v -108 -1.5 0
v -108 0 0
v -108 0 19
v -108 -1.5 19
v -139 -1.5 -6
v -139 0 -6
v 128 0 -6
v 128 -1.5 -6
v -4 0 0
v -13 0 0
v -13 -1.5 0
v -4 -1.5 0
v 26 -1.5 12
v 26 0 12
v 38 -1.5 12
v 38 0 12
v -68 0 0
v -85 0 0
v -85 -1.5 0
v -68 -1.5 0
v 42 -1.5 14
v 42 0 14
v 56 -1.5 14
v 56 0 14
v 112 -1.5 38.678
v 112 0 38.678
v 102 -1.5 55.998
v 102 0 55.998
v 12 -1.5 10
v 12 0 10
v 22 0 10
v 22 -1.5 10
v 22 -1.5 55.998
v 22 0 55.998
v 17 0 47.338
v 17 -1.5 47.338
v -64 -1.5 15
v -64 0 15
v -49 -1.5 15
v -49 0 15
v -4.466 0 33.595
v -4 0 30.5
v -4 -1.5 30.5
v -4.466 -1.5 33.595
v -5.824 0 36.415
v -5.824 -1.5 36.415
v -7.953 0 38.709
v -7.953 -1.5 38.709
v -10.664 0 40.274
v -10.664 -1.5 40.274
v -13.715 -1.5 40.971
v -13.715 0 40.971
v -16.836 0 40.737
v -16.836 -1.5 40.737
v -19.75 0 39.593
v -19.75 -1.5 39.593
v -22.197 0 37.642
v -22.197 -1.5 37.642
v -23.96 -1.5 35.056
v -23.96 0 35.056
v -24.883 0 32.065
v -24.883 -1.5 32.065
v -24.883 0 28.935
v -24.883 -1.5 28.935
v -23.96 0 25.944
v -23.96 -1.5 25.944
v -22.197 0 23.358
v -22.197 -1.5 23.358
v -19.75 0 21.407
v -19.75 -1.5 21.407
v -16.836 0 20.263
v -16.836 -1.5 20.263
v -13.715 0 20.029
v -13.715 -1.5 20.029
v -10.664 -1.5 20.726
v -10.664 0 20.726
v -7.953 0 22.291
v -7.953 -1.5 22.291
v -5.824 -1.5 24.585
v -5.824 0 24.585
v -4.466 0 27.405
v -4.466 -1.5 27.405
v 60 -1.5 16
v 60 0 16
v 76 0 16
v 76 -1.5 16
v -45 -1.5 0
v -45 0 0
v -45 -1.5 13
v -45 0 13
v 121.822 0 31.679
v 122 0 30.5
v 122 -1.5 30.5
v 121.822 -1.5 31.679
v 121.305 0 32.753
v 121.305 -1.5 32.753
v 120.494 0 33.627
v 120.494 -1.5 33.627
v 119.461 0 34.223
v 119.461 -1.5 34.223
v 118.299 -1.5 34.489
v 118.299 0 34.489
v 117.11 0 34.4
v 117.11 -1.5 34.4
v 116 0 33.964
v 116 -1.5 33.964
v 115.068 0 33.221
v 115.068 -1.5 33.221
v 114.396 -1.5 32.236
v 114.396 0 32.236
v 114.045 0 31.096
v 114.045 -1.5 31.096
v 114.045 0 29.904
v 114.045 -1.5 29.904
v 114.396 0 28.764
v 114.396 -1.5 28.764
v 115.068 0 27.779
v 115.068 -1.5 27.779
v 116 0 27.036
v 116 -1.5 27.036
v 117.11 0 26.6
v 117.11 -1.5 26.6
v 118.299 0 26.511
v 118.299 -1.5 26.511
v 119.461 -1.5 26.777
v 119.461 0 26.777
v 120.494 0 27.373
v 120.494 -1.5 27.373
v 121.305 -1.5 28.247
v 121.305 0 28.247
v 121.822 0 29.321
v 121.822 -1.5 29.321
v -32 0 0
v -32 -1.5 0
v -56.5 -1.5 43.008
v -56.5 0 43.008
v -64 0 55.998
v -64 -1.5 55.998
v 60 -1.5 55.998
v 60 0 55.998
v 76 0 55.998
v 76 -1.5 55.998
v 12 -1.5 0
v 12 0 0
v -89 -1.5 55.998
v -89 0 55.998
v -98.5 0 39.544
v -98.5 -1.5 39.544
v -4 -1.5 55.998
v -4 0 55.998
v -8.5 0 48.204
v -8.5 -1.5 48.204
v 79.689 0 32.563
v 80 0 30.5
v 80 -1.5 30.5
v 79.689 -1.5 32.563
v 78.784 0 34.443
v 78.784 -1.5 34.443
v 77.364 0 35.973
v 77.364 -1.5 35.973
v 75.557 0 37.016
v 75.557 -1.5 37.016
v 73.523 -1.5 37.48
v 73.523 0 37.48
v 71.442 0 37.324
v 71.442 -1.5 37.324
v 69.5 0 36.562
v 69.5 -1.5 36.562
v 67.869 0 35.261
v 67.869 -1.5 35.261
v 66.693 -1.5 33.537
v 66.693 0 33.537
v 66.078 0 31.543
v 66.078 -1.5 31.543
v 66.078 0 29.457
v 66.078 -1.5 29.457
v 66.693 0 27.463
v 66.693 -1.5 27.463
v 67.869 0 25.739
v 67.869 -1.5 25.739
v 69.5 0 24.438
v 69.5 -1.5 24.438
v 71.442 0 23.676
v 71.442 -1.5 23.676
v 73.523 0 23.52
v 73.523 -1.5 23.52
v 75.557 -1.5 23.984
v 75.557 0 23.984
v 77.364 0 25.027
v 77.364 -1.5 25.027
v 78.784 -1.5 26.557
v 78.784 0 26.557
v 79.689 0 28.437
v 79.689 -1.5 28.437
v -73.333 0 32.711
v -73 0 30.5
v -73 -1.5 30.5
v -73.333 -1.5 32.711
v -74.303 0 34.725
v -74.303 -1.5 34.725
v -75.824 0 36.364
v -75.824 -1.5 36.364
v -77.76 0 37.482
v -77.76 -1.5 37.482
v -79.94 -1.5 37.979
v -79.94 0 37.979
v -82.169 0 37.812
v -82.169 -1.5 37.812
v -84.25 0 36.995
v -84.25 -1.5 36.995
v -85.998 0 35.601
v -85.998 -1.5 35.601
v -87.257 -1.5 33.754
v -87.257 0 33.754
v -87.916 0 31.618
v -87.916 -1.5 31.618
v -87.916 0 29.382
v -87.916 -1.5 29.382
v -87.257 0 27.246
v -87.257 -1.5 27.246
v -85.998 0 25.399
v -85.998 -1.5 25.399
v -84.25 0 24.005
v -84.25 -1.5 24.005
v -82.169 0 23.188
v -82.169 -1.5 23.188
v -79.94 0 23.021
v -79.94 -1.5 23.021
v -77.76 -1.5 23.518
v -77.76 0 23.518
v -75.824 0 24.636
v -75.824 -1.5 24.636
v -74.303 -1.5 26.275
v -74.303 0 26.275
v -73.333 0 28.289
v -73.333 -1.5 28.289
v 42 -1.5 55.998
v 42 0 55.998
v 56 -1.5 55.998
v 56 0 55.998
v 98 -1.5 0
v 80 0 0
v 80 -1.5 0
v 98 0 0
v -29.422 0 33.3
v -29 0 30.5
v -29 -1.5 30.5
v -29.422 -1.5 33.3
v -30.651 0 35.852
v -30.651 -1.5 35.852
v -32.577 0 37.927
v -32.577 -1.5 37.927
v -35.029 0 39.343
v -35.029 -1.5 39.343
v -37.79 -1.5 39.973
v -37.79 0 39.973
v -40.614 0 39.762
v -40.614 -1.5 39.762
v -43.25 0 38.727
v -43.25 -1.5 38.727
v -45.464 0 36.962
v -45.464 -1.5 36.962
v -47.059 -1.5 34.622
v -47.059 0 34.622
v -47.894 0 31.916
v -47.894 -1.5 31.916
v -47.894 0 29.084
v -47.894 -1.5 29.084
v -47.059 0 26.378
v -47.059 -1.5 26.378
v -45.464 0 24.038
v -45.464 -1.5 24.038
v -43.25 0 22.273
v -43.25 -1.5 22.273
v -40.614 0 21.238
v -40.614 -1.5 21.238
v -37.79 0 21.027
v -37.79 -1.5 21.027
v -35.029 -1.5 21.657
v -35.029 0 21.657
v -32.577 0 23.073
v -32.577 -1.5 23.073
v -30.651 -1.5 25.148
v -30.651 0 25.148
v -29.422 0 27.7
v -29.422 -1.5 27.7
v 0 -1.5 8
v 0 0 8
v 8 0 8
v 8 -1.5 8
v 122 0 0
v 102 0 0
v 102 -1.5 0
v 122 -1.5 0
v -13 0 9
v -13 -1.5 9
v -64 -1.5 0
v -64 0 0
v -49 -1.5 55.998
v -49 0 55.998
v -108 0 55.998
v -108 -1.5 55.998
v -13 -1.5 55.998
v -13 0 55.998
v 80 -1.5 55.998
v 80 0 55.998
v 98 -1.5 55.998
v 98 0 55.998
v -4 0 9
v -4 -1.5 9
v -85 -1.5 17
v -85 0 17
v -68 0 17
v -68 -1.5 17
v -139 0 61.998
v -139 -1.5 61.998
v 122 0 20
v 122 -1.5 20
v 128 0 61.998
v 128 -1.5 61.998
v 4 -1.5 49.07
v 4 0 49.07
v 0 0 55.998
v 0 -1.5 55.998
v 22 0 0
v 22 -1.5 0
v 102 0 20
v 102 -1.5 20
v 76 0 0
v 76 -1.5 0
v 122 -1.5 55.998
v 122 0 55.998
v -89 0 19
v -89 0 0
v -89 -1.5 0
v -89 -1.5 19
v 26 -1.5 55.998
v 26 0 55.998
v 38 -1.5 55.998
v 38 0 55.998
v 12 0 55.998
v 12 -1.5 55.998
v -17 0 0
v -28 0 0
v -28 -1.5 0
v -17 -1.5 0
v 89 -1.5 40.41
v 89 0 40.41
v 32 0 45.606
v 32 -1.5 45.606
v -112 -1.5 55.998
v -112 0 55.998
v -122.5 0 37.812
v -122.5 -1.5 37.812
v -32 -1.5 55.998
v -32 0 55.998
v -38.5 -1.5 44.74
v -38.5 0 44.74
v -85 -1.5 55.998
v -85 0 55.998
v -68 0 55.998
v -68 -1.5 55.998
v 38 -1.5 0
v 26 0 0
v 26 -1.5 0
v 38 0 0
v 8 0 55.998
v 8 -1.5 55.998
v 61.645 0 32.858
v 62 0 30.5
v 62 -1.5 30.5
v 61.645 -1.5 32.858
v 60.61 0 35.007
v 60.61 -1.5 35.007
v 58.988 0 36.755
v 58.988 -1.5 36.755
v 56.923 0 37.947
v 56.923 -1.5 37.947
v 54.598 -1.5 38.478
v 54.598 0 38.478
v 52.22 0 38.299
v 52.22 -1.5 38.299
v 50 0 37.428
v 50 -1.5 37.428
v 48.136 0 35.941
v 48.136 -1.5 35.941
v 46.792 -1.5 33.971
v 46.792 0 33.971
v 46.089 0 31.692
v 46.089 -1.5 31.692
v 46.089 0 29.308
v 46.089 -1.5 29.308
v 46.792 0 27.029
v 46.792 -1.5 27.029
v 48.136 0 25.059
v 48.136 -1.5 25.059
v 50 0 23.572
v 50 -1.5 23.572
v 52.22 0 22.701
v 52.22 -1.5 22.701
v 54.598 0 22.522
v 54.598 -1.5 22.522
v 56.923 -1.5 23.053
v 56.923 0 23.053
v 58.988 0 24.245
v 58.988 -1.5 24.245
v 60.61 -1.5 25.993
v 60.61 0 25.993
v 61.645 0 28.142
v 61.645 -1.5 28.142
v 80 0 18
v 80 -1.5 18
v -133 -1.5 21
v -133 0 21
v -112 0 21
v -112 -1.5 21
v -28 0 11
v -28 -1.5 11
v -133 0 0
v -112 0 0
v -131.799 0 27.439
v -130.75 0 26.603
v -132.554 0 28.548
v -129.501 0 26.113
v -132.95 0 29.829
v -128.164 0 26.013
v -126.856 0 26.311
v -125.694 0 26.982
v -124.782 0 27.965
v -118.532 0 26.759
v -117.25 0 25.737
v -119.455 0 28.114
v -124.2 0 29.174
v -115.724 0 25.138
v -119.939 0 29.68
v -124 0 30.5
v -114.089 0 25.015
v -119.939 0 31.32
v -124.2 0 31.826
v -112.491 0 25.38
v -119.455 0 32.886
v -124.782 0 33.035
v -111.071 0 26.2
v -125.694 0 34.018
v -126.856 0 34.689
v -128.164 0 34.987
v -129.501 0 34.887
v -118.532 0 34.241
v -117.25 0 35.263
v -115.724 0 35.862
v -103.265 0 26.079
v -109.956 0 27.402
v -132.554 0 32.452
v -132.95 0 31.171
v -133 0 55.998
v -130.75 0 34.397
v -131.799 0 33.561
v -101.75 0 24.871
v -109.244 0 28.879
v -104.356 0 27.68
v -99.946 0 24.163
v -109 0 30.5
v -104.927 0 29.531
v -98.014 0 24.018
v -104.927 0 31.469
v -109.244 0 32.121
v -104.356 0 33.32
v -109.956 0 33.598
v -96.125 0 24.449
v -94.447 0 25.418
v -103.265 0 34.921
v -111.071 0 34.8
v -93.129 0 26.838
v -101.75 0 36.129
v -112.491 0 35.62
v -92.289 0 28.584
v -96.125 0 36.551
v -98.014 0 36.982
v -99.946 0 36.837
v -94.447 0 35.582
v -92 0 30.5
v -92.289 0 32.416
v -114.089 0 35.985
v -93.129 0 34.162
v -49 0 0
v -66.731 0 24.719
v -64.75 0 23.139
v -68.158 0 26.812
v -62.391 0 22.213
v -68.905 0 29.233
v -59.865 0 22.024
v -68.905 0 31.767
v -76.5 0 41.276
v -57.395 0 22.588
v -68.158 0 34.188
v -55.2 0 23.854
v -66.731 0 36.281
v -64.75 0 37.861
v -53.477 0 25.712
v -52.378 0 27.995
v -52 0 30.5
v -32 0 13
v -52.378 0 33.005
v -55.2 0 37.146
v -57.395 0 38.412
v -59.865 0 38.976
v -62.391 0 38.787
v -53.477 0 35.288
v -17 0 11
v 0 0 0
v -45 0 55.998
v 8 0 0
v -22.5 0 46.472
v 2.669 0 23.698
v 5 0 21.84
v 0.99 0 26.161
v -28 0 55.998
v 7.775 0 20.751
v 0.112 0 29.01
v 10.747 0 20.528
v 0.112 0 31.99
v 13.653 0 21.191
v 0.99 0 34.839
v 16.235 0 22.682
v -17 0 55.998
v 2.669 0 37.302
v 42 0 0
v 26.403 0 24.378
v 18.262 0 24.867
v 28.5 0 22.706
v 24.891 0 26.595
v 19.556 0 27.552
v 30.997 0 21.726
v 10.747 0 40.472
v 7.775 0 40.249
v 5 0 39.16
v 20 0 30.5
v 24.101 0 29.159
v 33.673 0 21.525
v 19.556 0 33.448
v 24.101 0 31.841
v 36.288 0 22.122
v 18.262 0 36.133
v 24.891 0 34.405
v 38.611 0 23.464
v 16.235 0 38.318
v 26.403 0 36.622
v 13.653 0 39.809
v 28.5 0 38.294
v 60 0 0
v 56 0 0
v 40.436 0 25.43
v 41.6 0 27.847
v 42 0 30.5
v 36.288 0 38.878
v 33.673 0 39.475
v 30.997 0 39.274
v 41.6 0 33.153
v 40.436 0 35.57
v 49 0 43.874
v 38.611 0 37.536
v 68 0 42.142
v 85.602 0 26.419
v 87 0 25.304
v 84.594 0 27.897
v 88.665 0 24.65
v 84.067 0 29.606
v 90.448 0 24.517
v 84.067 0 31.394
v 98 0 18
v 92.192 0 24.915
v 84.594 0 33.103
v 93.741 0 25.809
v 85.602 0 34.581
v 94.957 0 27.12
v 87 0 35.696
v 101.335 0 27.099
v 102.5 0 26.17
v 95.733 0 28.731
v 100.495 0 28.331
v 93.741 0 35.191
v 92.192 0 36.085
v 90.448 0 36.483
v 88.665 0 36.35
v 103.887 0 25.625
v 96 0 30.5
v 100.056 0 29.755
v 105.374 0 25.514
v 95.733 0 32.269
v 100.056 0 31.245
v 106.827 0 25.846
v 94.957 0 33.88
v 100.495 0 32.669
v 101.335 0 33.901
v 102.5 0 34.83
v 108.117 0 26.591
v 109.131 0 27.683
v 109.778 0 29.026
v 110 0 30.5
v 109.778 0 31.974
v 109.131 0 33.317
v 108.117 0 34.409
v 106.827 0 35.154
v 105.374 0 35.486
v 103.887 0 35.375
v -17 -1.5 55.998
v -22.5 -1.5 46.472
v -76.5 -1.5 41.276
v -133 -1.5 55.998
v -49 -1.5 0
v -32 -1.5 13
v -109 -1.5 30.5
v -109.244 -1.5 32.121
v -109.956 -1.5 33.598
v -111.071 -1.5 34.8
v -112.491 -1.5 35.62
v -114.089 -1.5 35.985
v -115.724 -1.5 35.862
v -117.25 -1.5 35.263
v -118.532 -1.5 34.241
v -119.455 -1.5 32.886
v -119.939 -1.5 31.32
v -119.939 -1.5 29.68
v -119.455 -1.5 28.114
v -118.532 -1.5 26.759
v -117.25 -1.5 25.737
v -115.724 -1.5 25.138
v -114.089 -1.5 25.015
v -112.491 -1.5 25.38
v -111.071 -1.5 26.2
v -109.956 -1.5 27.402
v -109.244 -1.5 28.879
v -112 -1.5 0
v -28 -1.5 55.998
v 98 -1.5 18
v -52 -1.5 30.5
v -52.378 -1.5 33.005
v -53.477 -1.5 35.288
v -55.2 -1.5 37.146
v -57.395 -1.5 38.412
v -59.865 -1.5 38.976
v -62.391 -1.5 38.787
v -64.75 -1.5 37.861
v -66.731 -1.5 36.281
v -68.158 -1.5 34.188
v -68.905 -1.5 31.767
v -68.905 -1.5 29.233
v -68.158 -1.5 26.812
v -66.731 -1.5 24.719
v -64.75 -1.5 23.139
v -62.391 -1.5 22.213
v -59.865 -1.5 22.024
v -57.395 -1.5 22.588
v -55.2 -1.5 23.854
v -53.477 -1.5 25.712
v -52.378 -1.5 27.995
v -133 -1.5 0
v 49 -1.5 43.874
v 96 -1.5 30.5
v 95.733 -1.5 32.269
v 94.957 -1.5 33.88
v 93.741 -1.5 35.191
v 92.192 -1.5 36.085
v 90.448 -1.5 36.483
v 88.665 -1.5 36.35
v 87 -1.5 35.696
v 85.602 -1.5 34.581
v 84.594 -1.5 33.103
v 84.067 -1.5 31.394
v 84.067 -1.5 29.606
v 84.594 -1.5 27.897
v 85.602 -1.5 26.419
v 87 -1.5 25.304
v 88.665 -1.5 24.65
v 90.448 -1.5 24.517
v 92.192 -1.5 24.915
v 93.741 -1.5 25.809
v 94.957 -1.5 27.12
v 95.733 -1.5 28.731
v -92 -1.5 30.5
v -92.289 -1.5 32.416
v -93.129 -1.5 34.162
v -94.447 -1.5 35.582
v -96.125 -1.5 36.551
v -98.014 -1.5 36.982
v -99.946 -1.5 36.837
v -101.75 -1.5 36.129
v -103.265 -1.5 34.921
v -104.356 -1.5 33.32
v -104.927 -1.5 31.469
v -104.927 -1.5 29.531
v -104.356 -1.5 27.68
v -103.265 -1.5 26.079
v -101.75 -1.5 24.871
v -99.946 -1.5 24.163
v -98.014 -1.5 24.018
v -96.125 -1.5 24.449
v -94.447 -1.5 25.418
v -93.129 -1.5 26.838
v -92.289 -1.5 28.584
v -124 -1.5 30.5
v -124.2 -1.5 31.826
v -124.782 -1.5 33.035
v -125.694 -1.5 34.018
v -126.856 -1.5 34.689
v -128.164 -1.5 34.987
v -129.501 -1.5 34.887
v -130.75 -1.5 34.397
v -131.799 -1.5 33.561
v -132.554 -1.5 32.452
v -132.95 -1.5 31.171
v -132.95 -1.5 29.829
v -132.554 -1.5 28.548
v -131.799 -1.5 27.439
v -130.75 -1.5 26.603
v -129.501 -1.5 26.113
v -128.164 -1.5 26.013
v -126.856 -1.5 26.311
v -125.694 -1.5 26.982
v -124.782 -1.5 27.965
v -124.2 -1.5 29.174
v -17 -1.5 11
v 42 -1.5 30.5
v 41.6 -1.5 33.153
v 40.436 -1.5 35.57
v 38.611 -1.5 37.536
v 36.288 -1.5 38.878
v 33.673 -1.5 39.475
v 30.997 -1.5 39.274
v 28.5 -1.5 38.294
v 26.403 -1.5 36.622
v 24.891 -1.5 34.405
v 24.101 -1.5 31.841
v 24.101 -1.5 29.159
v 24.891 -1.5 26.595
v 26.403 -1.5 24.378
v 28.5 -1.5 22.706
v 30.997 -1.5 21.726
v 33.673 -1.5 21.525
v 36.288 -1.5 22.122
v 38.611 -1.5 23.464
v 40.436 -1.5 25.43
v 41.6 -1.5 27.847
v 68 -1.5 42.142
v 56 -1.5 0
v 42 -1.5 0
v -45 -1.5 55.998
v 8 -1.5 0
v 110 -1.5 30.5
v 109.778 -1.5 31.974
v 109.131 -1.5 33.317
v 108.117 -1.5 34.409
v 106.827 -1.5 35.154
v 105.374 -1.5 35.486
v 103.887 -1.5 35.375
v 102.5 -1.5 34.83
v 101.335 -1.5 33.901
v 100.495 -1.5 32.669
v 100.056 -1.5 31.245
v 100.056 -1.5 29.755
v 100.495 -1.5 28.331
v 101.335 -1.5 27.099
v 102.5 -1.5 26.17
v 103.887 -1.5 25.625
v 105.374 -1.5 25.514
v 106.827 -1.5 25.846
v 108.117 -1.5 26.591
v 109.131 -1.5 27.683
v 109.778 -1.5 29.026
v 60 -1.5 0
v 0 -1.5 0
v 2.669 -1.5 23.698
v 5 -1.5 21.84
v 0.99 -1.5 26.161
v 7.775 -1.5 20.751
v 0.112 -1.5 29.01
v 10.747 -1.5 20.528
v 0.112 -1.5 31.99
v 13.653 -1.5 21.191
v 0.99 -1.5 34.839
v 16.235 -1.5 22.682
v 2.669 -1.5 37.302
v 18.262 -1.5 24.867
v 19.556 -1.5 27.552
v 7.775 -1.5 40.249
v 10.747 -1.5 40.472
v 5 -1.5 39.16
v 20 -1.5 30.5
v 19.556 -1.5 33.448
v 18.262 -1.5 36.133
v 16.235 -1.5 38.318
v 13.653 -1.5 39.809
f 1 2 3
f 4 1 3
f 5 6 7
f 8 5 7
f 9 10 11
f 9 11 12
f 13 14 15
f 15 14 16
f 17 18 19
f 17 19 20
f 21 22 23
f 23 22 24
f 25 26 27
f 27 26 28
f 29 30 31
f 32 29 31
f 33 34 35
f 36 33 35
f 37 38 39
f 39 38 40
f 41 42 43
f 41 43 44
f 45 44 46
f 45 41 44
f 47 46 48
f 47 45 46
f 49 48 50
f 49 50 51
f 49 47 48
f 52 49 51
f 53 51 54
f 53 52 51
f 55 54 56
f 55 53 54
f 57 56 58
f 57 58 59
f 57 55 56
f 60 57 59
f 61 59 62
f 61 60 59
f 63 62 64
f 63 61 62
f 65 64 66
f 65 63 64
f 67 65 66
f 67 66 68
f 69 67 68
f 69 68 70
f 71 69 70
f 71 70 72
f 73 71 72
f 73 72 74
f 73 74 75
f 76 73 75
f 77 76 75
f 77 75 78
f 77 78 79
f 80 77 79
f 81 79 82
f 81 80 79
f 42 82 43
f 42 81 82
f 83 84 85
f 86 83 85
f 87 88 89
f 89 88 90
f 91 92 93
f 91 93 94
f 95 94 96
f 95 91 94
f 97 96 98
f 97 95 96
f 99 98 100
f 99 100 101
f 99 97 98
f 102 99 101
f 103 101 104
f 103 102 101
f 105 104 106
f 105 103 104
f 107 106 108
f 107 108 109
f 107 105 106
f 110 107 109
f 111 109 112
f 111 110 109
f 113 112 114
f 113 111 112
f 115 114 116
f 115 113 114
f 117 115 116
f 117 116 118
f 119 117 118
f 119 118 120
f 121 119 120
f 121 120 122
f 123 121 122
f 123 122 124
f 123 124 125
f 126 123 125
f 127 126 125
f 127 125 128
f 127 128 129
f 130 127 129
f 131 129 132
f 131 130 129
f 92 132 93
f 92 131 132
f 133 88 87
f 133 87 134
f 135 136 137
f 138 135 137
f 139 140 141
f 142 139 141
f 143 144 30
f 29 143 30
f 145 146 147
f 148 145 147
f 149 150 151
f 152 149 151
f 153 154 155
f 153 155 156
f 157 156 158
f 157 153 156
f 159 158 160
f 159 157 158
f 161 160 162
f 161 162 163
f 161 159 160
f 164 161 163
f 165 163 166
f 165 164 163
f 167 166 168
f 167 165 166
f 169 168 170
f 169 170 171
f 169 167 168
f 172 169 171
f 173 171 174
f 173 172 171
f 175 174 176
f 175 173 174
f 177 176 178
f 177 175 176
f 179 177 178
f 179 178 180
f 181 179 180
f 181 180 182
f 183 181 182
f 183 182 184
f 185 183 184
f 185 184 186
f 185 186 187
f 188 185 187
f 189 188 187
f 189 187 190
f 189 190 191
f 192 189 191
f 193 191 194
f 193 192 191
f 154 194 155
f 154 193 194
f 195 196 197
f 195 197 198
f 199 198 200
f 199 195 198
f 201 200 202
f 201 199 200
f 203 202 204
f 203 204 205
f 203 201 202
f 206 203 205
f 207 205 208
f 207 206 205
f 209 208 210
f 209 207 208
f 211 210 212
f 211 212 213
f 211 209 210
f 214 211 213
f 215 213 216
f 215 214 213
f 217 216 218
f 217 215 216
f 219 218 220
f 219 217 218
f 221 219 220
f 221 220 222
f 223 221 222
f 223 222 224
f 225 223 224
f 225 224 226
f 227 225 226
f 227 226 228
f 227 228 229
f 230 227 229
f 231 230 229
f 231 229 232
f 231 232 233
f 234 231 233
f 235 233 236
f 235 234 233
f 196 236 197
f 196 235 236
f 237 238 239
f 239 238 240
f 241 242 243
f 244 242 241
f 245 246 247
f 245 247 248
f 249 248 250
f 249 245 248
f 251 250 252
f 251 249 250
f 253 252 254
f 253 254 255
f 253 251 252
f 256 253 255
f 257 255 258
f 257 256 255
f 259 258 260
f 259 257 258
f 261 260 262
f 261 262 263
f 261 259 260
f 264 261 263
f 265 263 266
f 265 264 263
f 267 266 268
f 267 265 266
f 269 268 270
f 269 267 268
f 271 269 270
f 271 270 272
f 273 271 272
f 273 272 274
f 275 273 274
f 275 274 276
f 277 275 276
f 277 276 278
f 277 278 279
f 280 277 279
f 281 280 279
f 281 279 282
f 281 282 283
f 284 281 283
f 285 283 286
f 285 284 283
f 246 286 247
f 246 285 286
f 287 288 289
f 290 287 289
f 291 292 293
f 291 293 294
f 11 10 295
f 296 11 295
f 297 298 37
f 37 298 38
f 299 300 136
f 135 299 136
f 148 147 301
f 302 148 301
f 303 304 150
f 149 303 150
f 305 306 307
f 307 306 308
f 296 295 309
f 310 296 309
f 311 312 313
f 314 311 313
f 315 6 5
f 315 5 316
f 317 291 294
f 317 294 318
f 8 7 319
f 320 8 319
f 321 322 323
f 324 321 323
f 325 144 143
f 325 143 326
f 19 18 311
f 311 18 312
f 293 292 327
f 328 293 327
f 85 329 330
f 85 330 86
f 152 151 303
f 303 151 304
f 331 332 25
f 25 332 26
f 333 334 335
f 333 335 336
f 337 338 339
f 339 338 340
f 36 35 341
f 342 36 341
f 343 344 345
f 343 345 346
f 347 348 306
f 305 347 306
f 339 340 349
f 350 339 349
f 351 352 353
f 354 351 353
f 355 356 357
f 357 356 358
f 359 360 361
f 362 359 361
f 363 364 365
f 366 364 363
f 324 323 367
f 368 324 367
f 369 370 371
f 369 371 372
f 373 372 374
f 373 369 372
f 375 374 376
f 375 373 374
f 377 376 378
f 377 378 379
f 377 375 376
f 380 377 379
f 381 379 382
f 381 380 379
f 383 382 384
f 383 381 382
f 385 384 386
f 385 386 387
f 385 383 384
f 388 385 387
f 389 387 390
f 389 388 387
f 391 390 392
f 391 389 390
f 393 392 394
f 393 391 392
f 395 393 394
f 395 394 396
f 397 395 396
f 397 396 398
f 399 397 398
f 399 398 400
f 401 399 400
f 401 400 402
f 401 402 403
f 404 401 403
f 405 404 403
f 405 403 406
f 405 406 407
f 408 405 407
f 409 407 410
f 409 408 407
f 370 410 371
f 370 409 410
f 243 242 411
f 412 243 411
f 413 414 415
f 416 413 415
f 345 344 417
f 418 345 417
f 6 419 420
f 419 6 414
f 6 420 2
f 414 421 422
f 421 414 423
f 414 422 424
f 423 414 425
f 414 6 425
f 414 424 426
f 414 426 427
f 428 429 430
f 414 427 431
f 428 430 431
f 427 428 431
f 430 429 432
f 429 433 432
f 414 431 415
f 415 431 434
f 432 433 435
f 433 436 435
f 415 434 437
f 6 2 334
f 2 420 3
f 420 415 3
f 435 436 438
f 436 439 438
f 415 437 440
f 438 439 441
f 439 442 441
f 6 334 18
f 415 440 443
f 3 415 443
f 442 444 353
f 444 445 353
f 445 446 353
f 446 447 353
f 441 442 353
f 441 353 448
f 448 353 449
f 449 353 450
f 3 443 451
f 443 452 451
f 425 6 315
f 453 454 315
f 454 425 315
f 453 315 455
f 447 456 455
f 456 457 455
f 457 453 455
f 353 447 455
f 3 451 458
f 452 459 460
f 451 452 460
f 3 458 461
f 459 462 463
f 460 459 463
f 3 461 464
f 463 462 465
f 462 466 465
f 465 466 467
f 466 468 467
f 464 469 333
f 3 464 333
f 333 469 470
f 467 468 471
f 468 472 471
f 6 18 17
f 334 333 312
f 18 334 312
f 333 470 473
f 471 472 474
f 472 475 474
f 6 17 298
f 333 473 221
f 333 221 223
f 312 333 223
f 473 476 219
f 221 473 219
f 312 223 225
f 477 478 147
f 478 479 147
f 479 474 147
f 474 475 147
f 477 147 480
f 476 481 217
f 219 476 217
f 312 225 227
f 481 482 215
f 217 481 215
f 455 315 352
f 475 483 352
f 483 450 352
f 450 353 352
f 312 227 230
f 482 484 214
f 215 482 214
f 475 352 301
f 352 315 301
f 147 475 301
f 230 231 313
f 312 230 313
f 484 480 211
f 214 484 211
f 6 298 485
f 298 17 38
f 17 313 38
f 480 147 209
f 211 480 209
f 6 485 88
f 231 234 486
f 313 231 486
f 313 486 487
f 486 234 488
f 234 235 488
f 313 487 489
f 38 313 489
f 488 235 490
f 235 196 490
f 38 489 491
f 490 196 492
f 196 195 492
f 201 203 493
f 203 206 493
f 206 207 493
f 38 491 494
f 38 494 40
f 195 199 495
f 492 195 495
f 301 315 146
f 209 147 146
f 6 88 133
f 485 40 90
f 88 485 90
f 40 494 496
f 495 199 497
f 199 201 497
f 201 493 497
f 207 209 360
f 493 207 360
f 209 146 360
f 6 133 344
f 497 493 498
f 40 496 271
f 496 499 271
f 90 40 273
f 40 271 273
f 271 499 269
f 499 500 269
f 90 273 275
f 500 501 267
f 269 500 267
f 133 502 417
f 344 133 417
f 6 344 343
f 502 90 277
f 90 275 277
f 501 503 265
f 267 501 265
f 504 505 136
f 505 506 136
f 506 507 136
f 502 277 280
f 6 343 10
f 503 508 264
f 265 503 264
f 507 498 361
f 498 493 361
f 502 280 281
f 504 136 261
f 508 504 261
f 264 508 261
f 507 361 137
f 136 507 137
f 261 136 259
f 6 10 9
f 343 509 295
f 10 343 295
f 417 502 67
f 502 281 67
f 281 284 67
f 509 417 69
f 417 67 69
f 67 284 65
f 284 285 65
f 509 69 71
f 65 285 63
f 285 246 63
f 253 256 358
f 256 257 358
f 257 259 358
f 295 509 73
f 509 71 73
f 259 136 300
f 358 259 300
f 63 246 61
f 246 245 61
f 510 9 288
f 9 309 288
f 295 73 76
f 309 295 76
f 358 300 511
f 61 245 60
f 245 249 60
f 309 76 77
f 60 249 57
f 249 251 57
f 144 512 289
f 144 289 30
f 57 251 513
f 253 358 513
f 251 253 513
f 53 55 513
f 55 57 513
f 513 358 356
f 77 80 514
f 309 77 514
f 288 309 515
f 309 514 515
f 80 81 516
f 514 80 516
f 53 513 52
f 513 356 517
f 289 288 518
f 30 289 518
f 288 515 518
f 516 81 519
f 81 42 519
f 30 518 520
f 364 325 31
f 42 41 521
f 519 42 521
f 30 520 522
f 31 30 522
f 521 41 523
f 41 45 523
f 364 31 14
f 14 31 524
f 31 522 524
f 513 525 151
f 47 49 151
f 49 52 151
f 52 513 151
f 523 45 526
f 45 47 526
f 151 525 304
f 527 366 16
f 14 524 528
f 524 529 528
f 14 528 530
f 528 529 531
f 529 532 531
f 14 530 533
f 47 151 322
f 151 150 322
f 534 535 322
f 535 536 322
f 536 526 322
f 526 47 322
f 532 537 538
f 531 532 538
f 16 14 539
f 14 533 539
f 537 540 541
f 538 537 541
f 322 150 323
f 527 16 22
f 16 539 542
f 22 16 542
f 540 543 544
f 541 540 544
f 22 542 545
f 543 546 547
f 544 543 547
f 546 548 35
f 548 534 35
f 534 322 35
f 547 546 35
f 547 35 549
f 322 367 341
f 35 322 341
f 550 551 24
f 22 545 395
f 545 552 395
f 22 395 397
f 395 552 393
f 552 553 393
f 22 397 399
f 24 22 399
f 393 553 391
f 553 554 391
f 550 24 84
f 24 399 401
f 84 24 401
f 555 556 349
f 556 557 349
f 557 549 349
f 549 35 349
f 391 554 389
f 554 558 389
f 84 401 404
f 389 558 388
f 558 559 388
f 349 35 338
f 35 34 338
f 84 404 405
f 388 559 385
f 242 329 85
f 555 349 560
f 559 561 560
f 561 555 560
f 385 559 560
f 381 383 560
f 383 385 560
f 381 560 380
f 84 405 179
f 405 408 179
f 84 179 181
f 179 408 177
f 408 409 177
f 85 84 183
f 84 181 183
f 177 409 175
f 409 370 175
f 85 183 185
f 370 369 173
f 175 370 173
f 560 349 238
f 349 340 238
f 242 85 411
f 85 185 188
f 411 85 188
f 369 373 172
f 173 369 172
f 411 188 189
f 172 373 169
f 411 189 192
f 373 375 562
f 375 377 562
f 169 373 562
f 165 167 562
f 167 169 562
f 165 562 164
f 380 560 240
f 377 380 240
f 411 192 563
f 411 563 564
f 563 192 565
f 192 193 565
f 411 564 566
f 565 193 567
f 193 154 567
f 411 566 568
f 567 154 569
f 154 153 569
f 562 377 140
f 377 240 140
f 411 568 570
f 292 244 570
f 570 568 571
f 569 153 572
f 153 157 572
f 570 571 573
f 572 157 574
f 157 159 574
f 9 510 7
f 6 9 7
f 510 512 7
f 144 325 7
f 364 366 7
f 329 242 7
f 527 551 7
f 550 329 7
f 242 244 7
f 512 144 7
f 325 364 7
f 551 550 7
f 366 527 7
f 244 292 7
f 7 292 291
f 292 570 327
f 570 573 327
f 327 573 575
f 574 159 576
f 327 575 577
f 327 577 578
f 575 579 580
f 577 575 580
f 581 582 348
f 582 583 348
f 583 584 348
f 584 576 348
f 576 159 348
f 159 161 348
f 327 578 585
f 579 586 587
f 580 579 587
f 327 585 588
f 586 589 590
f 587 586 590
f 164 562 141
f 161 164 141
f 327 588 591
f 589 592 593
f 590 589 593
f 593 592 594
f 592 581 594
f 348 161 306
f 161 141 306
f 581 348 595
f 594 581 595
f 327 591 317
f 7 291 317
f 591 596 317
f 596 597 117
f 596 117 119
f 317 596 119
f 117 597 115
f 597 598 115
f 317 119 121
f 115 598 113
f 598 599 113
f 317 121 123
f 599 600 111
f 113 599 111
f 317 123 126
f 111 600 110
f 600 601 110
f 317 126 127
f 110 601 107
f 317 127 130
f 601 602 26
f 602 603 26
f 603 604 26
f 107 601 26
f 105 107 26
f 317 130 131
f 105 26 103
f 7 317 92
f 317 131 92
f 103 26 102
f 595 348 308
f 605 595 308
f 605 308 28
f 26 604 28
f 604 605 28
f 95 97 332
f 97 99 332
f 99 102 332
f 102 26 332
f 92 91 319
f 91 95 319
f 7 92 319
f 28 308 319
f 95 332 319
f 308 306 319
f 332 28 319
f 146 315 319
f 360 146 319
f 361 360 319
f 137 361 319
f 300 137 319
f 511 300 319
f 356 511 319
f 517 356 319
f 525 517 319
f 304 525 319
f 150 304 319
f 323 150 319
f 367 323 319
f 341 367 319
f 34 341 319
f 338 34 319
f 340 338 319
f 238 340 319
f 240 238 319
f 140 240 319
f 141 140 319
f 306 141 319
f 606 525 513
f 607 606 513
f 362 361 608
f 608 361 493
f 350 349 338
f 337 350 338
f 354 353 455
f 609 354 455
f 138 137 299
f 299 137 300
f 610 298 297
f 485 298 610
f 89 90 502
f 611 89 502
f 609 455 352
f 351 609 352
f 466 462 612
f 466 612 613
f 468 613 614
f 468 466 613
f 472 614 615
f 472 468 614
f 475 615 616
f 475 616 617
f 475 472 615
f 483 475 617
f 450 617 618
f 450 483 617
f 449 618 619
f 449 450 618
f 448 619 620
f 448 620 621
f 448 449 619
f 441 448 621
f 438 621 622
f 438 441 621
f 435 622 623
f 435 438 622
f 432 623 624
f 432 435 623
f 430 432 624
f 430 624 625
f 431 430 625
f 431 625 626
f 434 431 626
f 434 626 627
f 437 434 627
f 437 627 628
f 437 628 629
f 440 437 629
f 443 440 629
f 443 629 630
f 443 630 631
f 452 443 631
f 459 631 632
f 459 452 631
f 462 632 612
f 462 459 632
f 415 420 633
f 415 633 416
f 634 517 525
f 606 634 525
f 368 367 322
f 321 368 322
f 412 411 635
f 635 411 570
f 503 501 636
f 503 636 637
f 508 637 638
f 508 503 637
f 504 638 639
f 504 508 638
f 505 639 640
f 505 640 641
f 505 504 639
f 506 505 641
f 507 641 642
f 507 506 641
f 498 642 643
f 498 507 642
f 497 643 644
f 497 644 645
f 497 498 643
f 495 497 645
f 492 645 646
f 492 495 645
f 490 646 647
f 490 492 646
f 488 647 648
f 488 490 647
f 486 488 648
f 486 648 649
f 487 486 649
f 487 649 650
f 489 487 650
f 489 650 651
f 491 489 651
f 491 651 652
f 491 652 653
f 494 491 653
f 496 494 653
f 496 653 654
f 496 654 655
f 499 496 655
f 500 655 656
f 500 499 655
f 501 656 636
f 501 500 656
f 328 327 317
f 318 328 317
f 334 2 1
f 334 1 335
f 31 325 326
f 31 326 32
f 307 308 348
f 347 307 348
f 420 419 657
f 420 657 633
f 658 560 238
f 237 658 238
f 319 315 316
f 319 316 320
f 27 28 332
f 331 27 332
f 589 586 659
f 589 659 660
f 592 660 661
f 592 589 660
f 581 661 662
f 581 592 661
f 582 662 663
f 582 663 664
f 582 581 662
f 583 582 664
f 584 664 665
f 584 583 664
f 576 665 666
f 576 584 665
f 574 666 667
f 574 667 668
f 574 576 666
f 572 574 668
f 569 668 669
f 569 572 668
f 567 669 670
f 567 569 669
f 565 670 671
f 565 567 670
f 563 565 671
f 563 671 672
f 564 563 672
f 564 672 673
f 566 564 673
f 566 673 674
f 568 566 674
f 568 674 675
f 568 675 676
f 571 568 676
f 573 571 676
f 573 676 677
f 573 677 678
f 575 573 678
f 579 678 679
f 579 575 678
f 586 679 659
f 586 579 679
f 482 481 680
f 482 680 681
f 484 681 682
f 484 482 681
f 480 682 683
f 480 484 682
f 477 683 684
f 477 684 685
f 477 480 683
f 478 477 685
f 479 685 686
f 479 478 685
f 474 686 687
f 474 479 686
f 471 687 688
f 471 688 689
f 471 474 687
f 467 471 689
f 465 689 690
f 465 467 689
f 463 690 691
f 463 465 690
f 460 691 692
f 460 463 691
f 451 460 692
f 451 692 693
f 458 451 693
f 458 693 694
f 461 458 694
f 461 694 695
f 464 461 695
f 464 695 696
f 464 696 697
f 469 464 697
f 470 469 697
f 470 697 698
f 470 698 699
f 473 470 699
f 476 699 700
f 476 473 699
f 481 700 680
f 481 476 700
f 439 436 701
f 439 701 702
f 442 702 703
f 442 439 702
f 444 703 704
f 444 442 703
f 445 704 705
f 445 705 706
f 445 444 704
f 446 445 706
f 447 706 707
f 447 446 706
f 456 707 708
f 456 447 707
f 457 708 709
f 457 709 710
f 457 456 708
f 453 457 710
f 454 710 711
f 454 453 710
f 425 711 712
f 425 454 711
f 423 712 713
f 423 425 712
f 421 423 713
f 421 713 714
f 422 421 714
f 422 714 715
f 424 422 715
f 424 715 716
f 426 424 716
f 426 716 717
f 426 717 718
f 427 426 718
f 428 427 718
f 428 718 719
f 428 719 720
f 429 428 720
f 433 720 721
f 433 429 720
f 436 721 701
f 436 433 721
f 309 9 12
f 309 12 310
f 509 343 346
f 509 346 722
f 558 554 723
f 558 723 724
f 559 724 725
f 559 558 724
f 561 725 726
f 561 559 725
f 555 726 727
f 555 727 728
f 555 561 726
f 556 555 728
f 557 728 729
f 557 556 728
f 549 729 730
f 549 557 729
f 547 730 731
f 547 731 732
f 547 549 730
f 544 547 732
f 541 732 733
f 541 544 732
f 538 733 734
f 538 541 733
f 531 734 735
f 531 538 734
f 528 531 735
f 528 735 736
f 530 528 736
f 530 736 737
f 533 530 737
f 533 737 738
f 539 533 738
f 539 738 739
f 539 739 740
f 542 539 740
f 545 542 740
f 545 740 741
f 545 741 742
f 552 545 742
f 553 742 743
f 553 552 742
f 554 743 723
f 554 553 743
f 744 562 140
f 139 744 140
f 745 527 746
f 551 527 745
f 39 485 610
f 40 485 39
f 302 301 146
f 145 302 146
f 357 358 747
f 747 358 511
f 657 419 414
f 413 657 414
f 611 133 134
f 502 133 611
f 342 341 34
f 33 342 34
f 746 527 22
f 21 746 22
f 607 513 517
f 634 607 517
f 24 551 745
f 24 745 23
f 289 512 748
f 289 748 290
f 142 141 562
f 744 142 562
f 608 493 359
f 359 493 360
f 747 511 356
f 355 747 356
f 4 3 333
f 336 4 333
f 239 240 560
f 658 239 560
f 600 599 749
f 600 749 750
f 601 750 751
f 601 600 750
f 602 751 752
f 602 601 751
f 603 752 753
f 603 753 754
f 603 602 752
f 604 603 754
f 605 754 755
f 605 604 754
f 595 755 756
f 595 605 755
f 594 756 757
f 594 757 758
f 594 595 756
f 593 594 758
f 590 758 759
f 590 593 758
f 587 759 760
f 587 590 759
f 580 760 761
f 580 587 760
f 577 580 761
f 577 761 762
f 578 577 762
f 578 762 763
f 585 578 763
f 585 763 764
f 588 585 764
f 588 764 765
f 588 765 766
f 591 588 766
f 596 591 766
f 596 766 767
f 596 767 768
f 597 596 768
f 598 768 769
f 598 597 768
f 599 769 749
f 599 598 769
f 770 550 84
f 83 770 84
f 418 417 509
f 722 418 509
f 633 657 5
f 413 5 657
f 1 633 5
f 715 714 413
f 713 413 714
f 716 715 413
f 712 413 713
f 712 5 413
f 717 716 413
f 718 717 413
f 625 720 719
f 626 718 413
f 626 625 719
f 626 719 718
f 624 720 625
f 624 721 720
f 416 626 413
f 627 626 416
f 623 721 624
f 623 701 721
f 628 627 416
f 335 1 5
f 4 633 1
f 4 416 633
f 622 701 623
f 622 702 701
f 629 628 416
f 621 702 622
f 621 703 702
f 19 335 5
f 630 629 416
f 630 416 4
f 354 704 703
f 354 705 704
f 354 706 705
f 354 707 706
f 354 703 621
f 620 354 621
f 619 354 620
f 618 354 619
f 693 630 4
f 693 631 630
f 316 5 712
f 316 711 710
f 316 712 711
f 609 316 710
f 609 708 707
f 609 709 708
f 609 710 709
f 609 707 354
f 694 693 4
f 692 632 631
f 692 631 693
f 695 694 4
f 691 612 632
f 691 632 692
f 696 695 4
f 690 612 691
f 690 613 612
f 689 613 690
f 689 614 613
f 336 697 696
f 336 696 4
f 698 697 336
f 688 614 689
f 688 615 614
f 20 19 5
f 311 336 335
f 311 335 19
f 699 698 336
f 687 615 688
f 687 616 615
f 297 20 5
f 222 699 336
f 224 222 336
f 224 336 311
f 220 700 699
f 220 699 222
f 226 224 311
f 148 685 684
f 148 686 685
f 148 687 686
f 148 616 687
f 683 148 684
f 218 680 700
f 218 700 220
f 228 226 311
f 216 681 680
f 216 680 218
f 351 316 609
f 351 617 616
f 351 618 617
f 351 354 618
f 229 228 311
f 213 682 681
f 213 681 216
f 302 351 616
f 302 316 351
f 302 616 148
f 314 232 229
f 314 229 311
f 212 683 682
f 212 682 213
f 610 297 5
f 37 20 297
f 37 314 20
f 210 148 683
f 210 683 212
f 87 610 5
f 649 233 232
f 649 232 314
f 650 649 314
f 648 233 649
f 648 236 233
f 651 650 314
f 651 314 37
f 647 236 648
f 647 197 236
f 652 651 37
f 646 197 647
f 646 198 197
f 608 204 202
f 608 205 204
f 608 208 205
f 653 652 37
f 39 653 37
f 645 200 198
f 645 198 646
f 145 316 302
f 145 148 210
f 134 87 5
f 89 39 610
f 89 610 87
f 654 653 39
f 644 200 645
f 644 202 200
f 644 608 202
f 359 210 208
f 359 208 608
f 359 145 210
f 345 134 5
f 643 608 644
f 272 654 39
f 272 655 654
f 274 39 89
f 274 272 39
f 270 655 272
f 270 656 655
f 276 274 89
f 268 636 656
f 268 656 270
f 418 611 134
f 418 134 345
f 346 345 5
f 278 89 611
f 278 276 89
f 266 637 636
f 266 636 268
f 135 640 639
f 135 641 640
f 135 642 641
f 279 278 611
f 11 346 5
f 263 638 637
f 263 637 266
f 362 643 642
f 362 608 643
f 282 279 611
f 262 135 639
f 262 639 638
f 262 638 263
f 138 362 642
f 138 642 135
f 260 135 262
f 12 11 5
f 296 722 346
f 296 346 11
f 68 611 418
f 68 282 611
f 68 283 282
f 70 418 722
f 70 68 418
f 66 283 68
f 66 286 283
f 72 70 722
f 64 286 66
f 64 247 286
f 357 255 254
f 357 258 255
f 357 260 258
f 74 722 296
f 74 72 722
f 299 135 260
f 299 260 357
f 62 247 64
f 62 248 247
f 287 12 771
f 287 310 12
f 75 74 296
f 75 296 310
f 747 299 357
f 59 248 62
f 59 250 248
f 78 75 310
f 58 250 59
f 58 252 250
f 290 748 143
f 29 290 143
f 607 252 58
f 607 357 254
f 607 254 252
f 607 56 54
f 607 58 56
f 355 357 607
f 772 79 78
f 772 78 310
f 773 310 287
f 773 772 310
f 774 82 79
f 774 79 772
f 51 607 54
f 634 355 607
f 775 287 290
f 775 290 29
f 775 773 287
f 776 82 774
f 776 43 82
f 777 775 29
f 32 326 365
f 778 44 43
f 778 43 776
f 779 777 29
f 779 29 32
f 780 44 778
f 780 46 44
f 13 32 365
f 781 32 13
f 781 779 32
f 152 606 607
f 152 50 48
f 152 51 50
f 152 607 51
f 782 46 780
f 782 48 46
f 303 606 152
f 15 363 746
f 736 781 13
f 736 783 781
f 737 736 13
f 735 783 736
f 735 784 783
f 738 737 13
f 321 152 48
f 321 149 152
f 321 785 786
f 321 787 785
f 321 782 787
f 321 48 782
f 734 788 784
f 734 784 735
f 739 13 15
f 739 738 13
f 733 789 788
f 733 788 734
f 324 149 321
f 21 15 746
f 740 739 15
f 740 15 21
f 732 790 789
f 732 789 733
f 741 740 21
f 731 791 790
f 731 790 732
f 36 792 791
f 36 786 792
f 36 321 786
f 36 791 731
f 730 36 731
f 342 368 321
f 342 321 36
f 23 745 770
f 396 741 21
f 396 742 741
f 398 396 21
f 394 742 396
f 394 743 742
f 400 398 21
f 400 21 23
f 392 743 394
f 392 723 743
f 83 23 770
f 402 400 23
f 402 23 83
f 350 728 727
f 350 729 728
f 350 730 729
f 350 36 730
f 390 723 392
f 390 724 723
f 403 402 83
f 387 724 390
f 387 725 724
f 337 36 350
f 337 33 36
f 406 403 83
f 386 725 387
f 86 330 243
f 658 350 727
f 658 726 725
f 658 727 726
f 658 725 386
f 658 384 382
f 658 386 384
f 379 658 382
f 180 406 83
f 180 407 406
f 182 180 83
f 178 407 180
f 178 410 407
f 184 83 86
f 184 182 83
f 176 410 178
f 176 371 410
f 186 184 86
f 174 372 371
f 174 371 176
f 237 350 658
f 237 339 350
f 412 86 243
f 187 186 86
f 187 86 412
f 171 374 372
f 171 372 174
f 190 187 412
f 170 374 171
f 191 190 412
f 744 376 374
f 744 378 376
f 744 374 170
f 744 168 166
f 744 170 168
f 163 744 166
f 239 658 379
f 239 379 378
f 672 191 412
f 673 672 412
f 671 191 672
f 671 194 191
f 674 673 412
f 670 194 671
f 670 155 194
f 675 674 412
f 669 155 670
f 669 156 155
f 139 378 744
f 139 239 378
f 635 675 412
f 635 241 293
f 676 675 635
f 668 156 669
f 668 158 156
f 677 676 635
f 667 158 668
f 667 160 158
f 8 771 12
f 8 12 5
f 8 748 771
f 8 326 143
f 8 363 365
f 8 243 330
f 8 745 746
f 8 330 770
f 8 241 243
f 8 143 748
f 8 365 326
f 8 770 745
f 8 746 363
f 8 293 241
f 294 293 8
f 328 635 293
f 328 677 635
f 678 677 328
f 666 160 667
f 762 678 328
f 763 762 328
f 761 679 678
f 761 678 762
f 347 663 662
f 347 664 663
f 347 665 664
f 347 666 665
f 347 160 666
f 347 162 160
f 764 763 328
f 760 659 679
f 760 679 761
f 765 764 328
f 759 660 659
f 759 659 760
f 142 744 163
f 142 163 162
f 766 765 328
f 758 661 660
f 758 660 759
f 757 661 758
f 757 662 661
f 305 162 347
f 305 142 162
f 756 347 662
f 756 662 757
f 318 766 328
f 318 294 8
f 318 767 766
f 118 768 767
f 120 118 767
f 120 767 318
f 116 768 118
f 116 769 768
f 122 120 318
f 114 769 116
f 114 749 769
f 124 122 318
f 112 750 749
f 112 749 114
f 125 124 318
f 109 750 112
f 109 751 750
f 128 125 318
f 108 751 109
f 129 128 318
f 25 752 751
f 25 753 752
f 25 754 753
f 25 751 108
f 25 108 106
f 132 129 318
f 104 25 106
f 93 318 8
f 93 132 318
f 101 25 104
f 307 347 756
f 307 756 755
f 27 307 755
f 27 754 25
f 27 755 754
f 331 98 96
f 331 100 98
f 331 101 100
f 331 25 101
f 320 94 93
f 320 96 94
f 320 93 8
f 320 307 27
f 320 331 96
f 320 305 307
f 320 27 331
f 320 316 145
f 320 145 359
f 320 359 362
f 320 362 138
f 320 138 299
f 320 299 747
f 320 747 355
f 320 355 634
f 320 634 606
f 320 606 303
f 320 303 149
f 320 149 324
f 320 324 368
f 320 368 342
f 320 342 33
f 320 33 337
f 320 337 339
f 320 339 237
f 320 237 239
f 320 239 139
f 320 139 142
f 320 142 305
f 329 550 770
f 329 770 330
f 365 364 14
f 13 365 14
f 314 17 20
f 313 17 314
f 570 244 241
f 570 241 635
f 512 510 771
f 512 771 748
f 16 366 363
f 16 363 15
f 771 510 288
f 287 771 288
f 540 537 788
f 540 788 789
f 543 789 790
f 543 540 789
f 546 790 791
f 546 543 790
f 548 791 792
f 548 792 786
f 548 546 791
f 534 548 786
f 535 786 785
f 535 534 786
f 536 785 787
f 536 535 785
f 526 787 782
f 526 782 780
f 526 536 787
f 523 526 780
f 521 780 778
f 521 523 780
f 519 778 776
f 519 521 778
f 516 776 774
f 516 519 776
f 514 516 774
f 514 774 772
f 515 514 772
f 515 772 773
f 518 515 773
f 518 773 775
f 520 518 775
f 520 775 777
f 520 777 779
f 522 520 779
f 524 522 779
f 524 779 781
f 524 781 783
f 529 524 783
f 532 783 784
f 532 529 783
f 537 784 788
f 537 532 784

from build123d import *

# Parameters (mm, degrees)
F0_W     = 267
F0_H     = 67.998115
F0_W_2   = 21
F0_H_2   = 21
F0_W_3   = 19
F0_H_3   = 19
F0_W_4   = 17
F0_H_4   = 17
F0_W_5   = 15
F0_H_5   = 15
F0_W_6   = 13
F0_H_6   = 13
F0_W_7   = 11
F0_H_7   = 11
F0_W_8   = 9
F0_H_8   = 9
F0_W_9   = 8
F0_H_9   = 8
F0_W_10  = 10
F0_H_10  = 10
F0_W_11  = 12
F0_H_11  = 12
F0_W_12  = 14
F0_H_12  = 14
F0_W_13  = 16
F0_H_13  = 16
F0_W_14  = 18
F0_H_14  = 18
F0_W_15  = 20
F0_H_15  = 20
F0_R     = 4.5
F0_R_2   = 5.5
F0_R_3   = 6.5
F0_R_4   = 7.5
F0_R_5   = 8.5
F0_R_6   = 9.5
F0_R_7   = 10.5
F0_R_8   = 10
F0_R_9   = 9
F0_R_10  = 8
F0_R_11  = 7
F0_R_12  = 6
F0_R_13  = 5
F0_R_14  = 4
F1_DEPTH = 1.5


with BuildPart() as f1:
    # F0 (on Front) → F1 (new body)
    with BuildSketch(Plane.XZ):
        with Locations((-5.5, 27.999057)):
            Rectangle(F0_W, F0_H)
        with Locations((-122.5, 10.5)):
            Rectangle(F0_W_2, F0_H_2, mode=Mode.SUBTRACT)
        with Locations((-98.5, 9.5)):
            Rectangle(F0_W_3, F0_H_3, mode=Mode.SUBTRACT)
        with Locations((-76.5, 8.5)):
            Rectangle(F0_W_4, F0_H_4, mode=Mode.SUBTRACT)
        with Locations((-56.5, 7.5)):
            Rectangle(F0_W_5, F0_H_5, mode=Mode.SUBTRACT)
        with Locations((-38.5, 6.5)):
            Rectangle(F0_W_6, F0_H_6, mode=Mode.SUBTRACT)
        with Locations((-22.5, 5.5)):
            Rectangle(F0_W_7, F0_H_7, mode=Mode.SUBTRACT)
        with Locations((-8.5, 4.5)):
            Rectangle(F0_W_8, F0_H_8, mode=Mode.SUBTRACT)
        with Locations((4, 4)):
            Rectangle(F0_W_9, F0_H_9, mode=Mode.SUBTRACT)
        with Locations((17, 5)):
            Rectangle(F0_W_10, F0_H_10, mode=Mode.SUBTRACT)
        with Locations((32, 6)):
            Rectangle(F0_W_11, F0_H_11, mode=Mode.SUBTRACT)
        with Locations((49, 7)):
            Rectangle(F0_W_12, F0_H_12, mode=Mode.SUBTRACT)
        with Locations((68, 8)):
            Rectangle(F0_W_13, F0_H_13, mode=Mode.SUBTRACT)
        with Locations((89, 9)):
            Rectangle(F0_W_14, F0_H_14, mode=Mode.SUBTRACT)
        with Locations((112, 10)):
            Rectangle(F0_W_15, F0_H_15, mode=Mode.SUBTRACT)
        with Locations((-128.5, 30.5)):
            Circle(F0_R, mode=Mode.SUBTRACT)
        with Locations((-114.5, 30.5)):
            Circle(F0_R_2, mode=Mode.SUBTRACT)
        with Locations((-98.5, 30.5)):
            Circle(F0_R_3, mode=Mode.SUBTRACT)
        with Locations((-80.5, 30.5)):
            Circle(F0_R_4, mode=Mode.SUBTRACT)
        with Locations((-60.5, 30.5)):
            Circle(F0_R_5, mode=Mode.SUBTRACT)
        with Locations((-38.5, 30.5)):
            Circle(F0_R_6, mode=Mode.SUBTRACT)
        with Locations((-14.5, 30.5)):
            Circle(F0_R_7, mode=Mode.SUBTRACT)
        Polygon((-122.5, 37.811581), (-133, 55.998115), (-112, 55.998115), align=None, mode=Mode.SUBTRACT)
        Polygon((-98.5, 39.543632), (-108, 55.998115), (-89, 55.998115), align=None, mode=Mode.SUBTRACT)
        Polygon((-76.5, 41.275683), (-85, 55.998115), (-68, 55.998115), align=None, mode=Mode.SUBTRACT)
        Polygon((-56.5, 43.007733), (-64, 55.998115), (-49, 55.998115), align=None, mode=Mode.SUBTRACT)
        Polygon((-38.5, 44.739784), (-45, 55.998115), (-32, 55.998115), align=None, mode=Mode.SUBTRACT)
        Polygon((-22.5, 46.471835), (-28, 55.998115), (-17, 55.998115), align=None, mode=Mode.SUBTRACT)
        Polygon((-8.5, 48.203886), (-13, 55.998115), (-4, 55.998115), align=None, mode=Mode.SUBTRACT)
        with Locations((10, 30.5)):
            Circle(F0_R_8, mode=Mode.SUBTRACT)
        with Locations((33, 30.5)):
            Circle(F0_R_9, mode=Mode.SUBTRACT)
        with Locations((54, 30.5)):
            Circle(F0_R_10, mode=Mode.SUBTRACT)
        with Locations((73, 30.5)):
            Circle(F0_R_11, mode=Mode.SUBTRACT)
        with Locations((90, 30.5)):
            Circle(F0_R_12, mode=Mode.SUBTRACT)
        with Locations((105, 30.5)):
            Circle(F0_R_13, mode=Mode.SUBTRACT)
        with Locations((118, 30.5)):
            Circle(F0_R_14, mode=Mode.SUBTRACT)
        Polygon((4, 49.069911), (0, 55.998115), (8, 55.998115), align=None, mode=Mode.SUBTRACT)
        Polygon((17, 47.33786), (12, 55.998115), (22, 55.998115), align=None, mode=Mode.SUBTRACT)
        Polygon((32, 45.60581), (26, 55.998115), (38, 55.998115), align=None, mode=Mode.SUBTRACT)
        Polygon((49, 43.873759), (42, 55.998115), (56, 55.998115), align=None, mode=Mode.SUBTRACT)
        Polygon((68, 42.141708), (60, 55.998115), (76, 55.998115), align=None, mode=Mode.SUBTRACT)
        Polygon((89, 40.409657), (80, 55.998115), (98, 55.998115), align=None, mode=Mode.SUBTRACT)
        Polygon((112, 38.677606), (102, 55.998115), (122, 55.998115), align=None, mode=Mode.SUBTRACT)
    extrude(amount=F1_DEPTH)


solid = f1.part
